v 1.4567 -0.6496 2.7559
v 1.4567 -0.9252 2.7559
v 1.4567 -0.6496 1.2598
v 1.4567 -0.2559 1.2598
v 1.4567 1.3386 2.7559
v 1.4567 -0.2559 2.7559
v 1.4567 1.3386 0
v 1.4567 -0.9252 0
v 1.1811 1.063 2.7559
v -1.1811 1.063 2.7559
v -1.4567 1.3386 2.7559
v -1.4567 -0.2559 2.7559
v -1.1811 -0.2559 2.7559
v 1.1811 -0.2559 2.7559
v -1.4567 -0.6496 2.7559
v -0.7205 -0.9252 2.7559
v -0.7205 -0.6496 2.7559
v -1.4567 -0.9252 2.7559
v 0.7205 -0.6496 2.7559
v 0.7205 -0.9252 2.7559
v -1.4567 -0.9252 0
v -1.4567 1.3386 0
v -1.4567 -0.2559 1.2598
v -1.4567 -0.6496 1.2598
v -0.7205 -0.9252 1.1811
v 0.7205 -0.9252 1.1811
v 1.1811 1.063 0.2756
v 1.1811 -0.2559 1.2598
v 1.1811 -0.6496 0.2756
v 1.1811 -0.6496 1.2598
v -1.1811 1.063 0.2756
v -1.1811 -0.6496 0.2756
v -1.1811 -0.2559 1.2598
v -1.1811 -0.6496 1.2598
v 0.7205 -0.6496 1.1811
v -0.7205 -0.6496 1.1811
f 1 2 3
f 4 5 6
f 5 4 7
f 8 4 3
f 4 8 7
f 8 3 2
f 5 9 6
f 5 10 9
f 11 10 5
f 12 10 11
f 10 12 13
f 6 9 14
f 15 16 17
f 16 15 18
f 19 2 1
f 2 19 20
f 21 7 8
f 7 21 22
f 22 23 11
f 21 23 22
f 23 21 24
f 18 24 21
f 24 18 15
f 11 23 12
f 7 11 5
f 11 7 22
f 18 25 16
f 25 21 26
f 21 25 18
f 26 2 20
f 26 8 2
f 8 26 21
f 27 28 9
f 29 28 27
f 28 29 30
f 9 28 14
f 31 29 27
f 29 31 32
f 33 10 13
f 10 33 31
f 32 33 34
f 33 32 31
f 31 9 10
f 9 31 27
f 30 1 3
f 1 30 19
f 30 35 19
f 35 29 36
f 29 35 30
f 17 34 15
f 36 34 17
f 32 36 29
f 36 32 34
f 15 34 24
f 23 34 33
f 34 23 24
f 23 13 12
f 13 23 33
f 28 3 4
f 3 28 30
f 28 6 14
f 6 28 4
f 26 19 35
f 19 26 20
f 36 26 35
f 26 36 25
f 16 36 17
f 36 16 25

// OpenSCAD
// file: defines.scad
// example012.stl is Mblock.stl, (c) 2009 Will Langford
// licensed under the Creative Commons - GNU GPL license.
// http://www.thingiverse.com/thing:753

//import("sim800c.stl", convexity=3);

// PCB

A = 2.5;
B = 7.4;

scale = 1/2.54;
// main file
include <defines.scad>

W = 5.75;
W_O = 2.35;
H = 7.0;

th = 0.7; // Walls

scale(scale) color("White") {

difference() {
// Base

  translate([-B/2, -W_O, 0])
    cube(size = [B, W, H], center = false);

  translate([-B/2 + th, -W_O + th, th])
    cube(size = [B - th*2, W - th*2, H], center = false);

    translate([-B/2-1 , -W_O + th, H-3.8])
      cube(size = [2, 1, 3.9], center = false);

    translate([ B/2-1 , -W_O + th, H-3.8])
      cube(size = [2, 1, 3.9], center = false);

    translate([ -3.66/2, -W_O - 1, H-4.0])
      cube(size = [3.66, 2, 4.1], center = false);
}


}
